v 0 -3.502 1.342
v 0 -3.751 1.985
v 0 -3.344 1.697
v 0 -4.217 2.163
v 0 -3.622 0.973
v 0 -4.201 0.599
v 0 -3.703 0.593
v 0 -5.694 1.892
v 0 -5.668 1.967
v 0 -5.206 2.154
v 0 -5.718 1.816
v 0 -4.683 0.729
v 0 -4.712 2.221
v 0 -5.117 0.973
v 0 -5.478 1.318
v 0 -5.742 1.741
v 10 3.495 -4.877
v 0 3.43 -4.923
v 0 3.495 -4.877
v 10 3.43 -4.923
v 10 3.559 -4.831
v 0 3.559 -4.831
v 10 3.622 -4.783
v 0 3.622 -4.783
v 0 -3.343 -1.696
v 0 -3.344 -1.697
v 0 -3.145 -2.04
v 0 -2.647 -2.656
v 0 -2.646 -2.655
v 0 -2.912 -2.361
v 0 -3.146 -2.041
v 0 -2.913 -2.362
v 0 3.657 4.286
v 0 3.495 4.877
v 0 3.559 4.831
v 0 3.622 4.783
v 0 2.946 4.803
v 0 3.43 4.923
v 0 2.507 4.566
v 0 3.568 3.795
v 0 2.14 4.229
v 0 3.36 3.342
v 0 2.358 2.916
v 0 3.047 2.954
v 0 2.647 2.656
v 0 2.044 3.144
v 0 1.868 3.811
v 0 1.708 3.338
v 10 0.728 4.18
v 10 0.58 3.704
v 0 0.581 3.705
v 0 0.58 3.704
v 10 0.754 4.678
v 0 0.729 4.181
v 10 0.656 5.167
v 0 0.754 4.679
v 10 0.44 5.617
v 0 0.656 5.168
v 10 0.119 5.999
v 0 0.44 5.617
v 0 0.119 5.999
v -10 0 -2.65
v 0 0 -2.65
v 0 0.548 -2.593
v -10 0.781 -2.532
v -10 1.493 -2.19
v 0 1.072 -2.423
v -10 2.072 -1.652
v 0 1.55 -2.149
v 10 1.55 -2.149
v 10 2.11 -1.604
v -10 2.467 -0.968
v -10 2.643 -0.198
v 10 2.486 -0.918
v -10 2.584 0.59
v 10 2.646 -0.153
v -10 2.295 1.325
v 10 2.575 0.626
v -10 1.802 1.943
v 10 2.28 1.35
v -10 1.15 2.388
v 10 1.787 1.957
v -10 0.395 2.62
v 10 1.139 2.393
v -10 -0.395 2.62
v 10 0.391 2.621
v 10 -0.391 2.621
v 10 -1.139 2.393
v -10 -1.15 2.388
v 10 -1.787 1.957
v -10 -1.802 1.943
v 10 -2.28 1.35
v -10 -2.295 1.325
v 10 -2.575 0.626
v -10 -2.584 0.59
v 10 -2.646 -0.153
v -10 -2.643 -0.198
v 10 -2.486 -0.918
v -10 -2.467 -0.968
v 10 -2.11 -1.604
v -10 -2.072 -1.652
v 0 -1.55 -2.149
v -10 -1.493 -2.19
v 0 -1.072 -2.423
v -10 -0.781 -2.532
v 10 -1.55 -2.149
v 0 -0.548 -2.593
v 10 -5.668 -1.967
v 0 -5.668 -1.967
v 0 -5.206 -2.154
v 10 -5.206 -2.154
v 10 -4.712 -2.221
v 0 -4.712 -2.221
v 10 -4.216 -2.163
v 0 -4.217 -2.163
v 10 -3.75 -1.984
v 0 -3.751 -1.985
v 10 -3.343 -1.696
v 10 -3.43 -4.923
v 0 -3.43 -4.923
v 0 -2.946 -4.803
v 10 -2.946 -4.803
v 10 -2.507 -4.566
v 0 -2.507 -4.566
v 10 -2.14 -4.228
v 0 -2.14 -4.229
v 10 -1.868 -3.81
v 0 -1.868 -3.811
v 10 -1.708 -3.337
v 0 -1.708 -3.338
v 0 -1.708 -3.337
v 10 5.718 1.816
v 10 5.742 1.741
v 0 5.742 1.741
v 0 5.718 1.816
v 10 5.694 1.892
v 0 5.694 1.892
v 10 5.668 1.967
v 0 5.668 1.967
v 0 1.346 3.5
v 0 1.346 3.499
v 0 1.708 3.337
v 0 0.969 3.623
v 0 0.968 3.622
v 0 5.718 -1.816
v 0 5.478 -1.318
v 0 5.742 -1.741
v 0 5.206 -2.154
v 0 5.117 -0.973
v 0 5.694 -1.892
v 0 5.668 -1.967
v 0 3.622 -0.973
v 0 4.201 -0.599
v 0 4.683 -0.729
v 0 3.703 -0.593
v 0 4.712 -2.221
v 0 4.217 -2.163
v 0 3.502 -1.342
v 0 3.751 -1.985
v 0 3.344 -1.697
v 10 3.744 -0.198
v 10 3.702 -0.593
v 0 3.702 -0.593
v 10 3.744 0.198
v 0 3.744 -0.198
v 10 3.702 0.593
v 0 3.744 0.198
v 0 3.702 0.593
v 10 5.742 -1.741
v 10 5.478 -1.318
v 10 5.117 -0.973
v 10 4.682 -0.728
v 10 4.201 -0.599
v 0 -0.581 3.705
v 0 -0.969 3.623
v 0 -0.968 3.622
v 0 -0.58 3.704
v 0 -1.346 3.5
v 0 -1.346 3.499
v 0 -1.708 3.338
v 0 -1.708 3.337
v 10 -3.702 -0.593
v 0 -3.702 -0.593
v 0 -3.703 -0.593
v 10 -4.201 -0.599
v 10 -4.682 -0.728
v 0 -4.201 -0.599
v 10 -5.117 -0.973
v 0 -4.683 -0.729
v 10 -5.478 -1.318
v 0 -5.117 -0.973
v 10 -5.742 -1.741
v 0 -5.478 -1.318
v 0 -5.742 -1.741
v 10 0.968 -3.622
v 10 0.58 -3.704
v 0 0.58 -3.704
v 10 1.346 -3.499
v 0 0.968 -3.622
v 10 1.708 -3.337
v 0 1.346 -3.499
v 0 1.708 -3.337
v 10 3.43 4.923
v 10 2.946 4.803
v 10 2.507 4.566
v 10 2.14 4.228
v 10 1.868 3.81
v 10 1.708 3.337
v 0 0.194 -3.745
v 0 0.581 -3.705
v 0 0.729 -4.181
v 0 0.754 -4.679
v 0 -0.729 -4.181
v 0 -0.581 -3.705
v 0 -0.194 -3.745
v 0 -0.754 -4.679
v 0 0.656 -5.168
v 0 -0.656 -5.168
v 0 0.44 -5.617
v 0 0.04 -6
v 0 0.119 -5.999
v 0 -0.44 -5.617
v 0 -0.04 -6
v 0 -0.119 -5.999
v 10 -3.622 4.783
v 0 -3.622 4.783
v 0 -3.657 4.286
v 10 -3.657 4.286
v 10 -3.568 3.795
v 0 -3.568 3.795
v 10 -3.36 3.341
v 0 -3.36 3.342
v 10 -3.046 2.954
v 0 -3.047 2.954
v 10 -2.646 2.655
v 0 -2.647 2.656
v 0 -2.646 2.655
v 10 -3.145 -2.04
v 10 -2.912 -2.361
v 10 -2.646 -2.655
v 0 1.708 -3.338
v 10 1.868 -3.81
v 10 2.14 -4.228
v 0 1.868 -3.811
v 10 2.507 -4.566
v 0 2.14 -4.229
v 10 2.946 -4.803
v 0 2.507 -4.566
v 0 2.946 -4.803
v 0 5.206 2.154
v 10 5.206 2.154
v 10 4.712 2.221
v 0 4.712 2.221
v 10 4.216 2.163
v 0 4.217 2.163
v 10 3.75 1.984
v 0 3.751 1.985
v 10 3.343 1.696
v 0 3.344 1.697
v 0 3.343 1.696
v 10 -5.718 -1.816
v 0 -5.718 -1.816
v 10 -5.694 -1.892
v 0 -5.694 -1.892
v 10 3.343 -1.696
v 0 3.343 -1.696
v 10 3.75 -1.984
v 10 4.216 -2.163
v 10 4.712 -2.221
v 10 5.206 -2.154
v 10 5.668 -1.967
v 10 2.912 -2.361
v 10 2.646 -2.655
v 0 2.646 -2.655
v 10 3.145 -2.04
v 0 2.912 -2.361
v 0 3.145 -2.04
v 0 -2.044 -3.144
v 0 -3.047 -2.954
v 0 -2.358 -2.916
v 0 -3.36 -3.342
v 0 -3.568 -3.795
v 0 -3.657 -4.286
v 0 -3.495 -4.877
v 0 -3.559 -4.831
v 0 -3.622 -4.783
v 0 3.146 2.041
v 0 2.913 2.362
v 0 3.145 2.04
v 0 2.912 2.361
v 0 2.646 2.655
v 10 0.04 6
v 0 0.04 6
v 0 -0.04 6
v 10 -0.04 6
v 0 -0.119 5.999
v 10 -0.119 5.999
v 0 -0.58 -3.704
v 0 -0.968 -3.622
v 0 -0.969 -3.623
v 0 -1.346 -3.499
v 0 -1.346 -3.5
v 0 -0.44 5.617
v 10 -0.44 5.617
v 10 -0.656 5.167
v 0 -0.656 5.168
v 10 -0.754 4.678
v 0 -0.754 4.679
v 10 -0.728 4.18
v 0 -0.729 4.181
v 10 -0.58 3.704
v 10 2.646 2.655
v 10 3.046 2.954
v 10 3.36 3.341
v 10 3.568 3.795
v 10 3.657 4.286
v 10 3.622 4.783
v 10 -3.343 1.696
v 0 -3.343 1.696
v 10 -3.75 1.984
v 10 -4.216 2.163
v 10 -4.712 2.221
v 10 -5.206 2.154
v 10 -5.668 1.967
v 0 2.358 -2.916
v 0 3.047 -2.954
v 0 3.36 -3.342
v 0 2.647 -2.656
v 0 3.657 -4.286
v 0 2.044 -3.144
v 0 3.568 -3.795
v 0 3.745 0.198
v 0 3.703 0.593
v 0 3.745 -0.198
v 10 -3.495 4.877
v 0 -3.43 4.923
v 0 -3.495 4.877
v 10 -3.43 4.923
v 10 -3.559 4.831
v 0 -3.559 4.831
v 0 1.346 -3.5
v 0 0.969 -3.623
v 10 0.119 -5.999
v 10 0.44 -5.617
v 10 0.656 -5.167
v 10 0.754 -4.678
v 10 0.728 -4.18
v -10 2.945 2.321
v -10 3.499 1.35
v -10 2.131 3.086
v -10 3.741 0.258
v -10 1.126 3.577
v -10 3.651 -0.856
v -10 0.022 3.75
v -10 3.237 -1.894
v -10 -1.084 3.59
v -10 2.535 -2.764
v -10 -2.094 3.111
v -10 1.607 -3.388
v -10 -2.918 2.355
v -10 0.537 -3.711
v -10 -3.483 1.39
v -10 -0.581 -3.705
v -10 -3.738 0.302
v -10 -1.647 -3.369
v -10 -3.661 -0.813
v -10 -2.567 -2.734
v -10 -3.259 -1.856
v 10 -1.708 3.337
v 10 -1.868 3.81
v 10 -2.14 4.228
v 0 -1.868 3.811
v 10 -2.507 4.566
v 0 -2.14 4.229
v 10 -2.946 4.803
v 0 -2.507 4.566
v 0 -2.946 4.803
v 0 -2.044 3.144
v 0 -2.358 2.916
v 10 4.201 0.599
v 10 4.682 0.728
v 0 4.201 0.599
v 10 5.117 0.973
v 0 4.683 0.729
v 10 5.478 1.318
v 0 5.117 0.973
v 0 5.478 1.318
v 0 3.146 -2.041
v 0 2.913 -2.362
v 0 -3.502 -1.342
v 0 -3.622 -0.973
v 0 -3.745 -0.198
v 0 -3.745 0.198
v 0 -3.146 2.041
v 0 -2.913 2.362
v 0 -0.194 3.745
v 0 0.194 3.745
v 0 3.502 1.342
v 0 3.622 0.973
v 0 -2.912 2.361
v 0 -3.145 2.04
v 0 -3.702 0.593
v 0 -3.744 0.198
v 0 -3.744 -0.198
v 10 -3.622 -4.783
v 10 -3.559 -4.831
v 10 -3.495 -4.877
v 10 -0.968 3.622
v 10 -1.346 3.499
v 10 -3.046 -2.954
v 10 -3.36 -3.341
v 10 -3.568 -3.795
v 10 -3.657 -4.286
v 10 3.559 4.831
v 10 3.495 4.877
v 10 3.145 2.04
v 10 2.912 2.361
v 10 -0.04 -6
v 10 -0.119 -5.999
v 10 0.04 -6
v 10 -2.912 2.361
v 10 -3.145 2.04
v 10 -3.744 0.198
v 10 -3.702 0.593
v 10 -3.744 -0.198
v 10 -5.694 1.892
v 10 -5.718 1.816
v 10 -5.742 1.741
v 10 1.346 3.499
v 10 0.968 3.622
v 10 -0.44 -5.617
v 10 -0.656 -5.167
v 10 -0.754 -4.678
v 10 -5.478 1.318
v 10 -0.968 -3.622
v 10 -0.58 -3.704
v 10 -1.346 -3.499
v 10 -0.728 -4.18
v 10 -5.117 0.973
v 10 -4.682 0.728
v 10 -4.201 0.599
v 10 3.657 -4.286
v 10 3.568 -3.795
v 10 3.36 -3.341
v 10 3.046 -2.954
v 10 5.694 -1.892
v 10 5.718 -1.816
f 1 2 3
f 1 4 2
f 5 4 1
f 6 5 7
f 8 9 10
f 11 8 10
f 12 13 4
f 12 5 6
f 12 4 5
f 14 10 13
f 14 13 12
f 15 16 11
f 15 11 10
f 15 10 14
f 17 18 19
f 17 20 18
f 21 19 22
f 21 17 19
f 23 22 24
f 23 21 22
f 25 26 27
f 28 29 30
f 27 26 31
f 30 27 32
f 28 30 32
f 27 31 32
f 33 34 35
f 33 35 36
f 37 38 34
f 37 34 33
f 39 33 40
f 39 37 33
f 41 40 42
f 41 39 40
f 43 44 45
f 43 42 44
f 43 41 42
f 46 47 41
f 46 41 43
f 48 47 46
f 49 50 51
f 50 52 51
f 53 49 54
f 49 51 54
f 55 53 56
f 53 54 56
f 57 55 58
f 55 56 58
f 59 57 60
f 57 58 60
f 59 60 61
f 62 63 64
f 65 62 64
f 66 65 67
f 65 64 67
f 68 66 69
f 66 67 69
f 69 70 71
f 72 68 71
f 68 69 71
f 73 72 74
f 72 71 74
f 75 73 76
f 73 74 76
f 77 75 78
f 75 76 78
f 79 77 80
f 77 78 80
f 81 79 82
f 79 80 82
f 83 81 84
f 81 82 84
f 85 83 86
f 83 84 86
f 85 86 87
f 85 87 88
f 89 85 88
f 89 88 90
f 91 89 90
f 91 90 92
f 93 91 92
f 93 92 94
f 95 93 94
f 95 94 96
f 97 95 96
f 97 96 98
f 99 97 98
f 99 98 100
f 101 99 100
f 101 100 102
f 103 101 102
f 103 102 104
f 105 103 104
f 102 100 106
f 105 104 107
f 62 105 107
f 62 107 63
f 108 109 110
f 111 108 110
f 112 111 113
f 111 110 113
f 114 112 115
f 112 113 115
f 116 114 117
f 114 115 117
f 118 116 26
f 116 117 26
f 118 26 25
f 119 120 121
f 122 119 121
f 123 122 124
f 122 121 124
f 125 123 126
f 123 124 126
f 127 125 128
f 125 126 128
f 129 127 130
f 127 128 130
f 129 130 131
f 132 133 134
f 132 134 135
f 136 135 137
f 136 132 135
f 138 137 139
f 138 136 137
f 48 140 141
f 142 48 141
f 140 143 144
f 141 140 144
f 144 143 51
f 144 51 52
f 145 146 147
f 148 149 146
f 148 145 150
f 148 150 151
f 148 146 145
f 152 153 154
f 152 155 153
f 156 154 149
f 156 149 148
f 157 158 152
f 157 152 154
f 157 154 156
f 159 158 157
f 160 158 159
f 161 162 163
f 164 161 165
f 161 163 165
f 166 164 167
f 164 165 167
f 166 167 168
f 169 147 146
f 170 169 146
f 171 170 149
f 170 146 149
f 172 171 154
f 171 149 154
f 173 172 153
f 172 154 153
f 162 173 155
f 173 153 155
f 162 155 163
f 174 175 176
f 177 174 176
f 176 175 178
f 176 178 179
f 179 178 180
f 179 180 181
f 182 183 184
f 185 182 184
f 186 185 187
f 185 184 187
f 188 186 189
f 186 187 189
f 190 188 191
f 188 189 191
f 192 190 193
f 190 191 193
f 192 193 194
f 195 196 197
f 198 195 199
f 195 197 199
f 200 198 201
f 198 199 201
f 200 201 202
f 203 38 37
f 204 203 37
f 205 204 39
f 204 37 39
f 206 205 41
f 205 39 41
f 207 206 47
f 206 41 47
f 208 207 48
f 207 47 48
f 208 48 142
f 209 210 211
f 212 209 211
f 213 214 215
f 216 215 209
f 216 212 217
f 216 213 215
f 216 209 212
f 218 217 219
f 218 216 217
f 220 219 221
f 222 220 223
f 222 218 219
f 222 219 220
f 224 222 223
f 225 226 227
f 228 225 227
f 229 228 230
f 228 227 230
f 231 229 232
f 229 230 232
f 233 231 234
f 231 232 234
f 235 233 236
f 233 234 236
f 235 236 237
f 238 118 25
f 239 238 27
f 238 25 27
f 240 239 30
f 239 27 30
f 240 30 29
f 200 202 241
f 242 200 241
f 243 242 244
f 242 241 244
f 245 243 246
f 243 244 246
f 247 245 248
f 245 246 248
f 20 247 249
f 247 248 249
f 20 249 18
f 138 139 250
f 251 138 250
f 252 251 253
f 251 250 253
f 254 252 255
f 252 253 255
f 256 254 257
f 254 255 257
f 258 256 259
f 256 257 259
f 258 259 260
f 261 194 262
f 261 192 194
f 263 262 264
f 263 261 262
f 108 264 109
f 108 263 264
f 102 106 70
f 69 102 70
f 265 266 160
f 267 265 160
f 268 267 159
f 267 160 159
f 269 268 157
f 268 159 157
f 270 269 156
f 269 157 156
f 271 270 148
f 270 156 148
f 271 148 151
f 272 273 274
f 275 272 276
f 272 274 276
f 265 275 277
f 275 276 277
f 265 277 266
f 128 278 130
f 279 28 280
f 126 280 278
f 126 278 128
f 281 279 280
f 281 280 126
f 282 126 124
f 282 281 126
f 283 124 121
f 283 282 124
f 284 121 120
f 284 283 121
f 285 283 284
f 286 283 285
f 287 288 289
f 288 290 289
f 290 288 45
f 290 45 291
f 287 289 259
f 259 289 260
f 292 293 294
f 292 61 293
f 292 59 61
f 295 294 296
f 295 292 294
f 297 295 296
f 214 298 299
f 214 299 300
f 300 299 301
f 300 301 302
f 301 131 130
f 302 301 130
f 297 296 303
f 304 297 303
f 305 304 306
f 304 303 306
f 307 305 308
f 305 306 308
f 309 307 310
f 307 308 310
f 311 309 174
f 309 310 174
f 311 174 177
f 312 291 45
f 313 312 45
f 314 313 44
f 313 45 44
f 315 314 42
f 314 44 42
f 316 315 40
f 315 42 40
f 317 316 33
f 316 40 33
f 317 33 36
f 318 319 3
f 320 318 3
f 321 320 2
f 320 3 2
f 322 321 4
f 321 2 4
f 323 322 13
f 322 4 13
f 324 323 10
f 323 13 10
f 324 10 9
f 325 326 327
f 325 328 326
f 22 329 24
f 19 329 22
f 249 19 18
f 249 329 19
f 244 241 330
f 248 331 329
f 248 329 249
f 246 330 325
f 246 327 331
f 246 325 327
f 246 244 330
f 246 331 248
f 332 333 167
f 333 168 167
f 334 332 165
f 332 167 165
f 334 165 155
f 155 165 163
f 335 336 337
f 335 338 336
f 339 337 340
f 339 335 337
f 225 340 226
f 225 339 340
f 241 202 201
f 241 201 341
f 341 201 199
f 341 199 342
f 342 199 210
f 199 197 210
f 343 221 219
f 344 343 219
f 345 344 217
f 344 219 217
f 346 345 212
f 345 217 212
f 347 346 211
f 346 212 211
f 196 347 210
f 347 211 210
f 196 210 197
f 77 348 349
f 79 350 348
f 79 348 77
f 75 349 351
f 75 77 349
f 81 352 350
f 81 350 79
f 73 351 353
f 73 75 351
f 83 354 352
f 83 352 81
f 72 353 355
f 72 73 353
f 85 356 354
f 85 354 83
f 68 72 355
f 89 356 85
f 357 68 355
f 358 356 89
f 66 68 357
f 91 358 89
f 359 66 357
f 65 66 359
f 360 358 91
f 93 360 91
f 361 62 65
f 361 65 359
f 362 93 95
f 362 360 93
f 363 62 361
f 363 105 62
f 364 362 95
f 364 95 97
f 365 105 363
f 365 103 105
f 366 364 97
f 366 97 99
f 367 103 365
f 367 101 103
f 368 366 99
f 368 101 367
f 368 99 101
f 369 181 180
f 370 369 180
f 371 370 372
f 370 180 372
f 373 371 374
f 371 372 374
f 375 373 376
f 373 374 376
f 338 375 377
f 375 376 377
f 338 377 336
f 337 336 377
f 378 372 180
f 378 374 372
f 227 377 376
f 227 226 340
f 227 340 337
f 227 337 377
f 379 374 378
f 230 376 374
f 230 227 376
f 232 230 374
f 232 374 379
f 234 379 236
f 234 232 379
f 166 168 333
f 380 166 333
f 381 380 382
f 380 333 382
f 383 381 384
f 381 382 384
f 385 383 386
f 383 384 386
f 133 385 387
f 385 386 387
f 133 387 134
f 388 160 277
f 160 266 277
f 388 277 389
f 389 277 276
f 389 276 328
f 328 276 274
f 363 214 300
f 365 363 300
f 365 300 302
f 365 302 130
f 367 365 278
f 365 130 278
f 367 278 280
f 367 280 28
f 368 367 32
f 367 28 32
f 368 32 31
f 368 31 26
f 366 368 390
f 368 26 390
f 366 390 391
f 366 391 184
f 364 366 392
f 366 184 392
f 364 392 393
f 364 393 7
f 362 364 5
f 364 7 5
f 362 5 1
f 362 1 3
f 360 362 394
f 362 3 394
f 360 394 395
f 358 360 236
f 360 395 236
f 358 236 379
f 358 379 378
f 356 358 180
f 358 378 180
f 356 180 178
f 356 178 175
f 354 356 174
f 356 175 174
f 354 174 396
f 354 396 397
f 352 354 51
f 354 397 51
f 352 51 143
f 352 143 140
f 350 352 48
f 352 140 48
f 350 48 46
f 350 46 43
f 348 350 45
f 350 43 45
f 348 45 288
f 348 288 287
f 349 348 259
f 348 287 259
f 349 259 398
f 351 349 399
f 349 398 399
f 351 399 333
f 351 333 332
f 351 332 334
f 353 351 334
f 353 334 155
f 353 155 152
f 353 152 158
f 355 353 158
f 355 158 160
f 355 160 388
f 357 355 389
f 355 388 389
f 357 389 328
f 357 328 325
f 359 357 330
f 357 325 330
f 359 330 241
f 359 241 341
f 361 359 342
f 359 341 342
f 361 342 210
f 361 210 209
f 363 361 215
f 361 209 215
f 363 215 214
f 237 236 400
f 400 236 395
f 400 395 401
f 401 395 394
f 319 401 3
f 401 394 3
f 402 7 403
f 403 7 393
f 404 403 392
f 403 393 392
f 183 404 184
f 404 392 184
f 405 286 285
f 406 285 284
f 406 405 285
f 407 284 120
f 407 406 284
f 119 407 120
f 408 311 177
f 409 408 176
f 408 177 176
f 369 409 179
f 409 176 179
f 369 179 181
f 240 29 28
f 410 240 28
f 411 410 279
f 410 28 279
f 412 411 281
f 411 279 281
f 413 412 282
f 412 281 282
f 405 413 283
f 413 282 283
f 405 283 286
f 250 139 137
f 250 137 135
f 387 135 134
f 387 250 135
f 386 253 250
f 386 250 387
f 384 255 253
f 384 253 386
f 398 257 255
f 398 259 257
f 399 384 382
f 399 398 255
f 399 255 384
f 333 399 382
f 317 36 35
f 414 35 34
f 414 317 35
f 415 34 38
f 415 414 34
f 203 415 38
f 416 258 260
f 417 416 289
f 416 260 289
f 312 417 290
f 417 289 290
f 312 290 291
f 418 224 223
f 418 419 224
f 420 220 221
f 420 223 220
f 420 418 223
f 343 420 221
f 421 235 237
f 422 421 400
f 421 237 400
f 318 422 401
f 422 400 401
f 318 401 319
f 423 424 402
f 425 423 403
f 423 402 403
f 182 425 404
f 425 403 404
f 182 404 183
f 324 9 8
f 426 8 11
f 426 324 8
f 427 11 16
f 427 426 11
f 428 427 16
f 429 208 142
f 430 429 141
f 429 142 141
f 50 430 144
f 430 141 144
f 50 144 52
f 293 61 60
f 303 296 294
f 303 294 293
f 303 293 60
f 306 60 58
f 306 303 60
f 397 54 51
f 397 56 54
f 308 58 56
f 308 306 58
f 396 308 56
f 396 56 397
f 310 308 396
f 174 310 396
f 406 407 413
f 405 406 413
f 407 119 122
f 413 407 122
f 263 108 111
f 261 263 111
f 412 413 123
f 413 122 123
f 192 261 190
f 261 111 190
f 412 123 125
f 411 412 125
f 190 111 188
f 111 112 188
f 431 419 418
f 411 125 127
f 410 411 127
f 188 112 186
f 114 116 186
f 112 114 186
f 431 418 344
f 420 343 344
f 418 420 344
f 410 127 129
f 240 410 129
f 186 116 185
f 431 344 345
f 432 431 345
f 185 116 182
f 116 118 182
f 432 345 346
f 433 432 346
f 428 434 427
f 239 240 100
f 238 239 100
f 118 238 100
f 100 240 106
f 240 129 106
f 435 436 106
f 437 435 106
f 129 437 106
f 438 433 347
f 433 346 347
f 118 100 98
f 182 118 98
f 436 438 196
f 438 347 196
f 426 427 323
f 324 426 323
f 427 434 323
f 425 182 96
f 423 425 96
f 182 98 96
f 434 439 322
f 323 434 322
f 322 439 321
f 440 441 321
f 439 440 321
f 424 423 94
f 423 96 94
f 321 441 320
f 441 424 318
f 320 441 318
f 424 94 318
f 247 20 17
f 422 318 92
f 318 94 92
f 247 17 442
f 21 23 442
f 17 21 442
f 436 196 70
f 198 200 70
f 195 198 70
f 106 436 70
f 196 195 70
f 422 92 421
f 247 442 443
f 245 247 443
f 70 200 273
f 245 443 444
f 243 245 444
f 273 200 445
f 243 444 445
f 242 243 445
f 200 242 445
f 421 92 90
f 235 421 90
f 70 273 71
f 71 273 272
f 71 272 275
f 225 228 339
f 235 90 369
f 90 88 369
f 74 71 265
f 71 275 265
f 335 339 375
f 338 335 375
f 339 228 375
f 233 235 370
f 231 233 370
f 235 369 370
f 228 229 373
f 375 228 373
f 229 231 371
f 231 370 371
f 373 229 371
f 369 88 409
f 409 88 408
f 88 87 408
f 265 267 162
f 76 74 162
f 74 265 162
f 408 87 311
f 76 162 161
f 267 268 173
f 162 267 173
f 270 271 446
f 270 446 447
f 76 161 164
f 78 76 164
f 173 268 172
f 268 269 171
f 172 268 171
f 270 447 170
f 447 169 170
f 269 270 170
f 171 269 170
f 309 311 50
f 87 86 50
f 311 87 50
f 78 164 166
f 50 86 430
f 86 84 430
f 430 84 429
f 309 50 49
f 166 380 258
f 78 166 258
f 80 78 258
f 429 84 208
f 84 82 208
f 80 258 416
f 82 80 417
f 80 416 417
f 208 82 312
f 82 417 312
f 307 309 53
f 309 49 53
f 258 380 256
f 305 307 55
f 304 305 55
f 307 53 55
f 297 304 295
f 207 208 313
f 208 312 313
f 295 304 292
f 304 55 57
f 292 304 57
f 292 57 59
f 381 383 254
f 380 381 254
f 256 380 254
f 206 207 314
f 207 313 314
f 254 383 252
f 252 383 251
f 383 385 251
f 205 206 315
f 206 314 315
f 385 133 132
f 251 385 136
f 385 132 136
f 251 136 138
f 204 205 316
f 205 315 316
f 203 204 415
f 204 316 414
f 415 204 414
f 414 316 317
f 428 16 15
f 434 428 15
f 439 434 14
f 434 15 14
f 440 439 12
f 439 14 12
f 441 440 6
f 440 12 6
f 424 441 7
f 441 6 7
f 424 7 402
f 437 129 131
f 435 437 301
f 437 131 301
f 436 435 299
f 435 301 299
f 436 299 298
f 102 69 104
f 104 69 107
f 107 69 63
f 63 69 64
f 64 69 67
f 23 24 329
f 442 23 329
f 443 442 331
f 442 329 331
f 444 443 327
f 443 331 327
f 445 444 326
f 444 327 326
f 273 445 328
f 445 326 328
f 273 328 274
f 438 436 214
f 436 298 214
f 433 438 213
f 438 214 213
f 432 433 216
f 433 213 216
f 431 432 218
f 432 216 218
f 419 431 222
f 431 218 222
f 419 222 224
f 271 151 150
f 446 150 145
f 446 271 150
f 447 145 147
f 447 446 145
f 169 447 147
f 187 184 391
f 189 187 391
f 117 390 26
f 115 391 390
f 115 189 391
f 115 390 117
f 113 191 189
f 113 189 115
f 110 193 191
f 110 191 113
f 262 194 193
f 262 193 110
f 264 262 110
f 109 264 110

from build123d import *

# Parameters (mm, degrees)
BASPROSKE_W                  = 10
BASPROSKE_H                  = 6
TOOTHCUT_DEPTH               = 14.114877049
TEETHCUTS_COUNT              = 10
TEETHCUTS_ANGLE              = 324
BORSKE_R                     = 0.4
BORE_DEPTH                   = 50.0000508
CROQUIS1_R                   = 3.75
SALIENTE_EXTRUIR1_DEPTH      = 10
TALADRO_DE_MARGEN_PARA_M51_D = 5.3
SALIENTE_EXTRUIR2_DEPTH      = 10


with BuildPart() as part:
    # BasProSke → Base-Revolve (revolve)
    with BuildSketch(Plane(origin=(0, 0, 0), x_dir=(1, 0, 0), z_dir=(0, 1, 0)), mode=Mode.PRIVATE) as base_revolve_sk:
        with Locations((5, 3)):
            Rectangle(BASPROSKE_W, BASPROSKE_H)
    revolve(base_revolve_sk.sketch.rotate(Axis((-10, 0, 0), (1, 0, 0)), 180), axis=Axis((-10, 0, 0), (1, 0, 0)))

    # TooCutSke → ToothCut (cut, through all)
    with BuildSketch(Plane(origin=(0, 0, 0), x_dir=(0, 0, -1), z_dir=(1, 0, 0))):
        with BuildLine():
            ThreePointArc((0.59278292, 3.701838653), (0, 3.749), (-0.59278292, 3.701838653))
            ThreePointArc((-0.59278292, 3.701838653), (-0.846593509, 4.924114224), (-1.775771316, 5.757784417))
            ThreePointArc((-1.775771316, 5.757784417), (0, 6.0254), (1.775771316, 5.757784417))
            ThreePointArc((1.775771316, 5.757784417), (0.846593509, 4.924114224), (0.59278292, 3.701838653))
        make_face()
    toothcut = extrude(amount=TOOTHCUT_DEPTH, mode=Mode.SUBTRACT)

    # TeethCuts: ToothCut ×10 about axis
    teethcuts_axis = Axis((-10, 0, 0), (1, 0, 0))
    for i in range(1, TEETHCUTS_COUNT):
        add(toothcut.rotate(teethcuts_axis, i * TEETHCUTS_ANGLE / (TEETHCUTS_COUNT - 1)), mode=Mode.SUBTRACT)

    # BorSke → Bore (cut, symmetric)
    with BuildSketch(Plane(origin=(0, 0, 0), x_dir=(0, 0, -1), z_dir=(1, 0, 0))):
        with Locations(Location((0, 0, 0), (0, 0, 180))):
            Circle(BORSKE_R)
    extrude(amount=BORE_DEPTH, both=True, mode=Mode.SUBTRACT)

    # Croquis1 → Saliente-Extruir1 (add)
    with BuildSketch(Plane.ZY):
        with Locations(Location((0, 0, 0), (0, 0, 188.906595326))):
            Circle(CROQUIS1_R)
    extrude(amount=SALIENTE_EXTRUIR1_DEPTH)

    # Taladro de margen para M51 (through all)
    with Locations(Plane.ZY.offset(10)):
        with Locations((0, 0)):
            Hole(TALADRO_DE_MARGEN_PARA_M51_D / 2)

    # Croquis5 → Saliente-Extruir2 (add)
    with BuildSketch(Plane(origin=(10, 0, 0), x_dir=(0, 0, -1), z_dir=(1, 0, 0))):
        with BuildLine():
            Line((2.149418526, 0), (2.149418526, 1.55))
            ThreePointArc((2.149418526, 1.55), (2.65, 0), (2.149418526, -1.55))
            Line((2.149418526, -1.55), (2.149418526, 0))
        make_face()
    extrude(amount=-SALIENTE_EXTRUIR2_DEPTH)


solid = part.part
